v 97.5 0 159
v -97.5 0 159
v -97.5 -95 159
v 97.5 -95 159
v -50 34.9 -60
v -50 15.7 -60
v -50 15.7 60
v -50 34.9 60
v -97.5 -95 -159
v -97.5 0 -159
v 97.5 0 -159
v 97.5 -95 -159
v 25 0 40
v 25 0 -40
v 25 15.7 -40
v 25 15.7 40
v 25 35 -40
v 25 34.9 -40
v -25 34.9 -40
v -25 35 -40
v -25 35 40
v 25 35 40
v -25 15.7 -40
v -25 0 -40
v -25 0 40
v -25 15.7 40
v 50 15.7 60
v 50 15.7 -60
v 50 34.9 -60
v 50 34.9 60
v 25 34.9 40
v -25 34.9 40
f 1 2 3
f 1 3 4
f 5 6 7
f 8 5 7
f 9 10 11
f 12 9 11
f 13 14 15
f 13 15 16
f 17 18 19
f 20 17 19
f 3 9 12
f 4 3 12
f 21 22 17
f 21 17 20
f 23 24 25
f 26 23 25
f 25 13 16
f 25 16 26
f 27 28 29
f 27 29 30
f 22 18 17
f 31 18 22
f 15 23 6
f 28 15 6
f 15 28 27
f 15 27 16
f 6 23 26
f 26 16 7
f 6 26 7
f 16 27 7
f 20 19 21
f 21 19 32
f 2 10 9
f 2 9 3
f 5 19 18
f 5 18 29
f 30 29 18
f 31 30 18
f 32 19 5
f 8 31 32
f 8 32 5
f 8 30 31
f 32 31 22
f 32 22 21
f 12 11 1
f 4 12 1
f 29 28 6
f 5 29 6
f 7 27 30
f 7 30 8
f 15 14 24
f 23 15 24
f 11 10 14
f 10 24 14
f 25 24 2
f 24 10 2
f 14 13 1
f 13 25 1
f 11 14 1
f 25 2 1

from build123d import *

# Parameters (mm, degrees)
F0_W     = 195
F0_H     = 318
F1_DEPTH = 95
F2_W     = 50
F2_H     = 80
F3_DEPTH = 35
F4_START = 15.7
F2_W_2   = 100
F2_H_2   = 120
F4_DEPTH = 19.2


with BuildPart() as f1:
    # F0 (on Front) → F1 (new body)
    with BuildSketch(Plane.XZ):
        Rectangle(F0_W, F0_H)
    extrude(amount=F1_DEPTH)

    # F2 (on face) → F3 (join)
    with BuildSketch(Plane(origin=(0, 0, 0), x_dir=(-1, 0, 0), z_dir=(0, 1, 0))):
        Rectangle(F2_W, F2_H)
    extrude(amount=F3_DEPTH)

    # F2 (on face) → F4 (join)
    with BuildSketch(Plane(origin=(0, 0, 0), x_dir=(-1, 0, 0), z_dir=(0, 1, 0)).offset(F4_START)):
        Rectangle(F2_W_2, F2_H_2)
        Rectangle(F2_W, F2_H, mode=Mode.SUBTRACT)
    extrude(amount=F4_DEPTH)


solid = f1.part
